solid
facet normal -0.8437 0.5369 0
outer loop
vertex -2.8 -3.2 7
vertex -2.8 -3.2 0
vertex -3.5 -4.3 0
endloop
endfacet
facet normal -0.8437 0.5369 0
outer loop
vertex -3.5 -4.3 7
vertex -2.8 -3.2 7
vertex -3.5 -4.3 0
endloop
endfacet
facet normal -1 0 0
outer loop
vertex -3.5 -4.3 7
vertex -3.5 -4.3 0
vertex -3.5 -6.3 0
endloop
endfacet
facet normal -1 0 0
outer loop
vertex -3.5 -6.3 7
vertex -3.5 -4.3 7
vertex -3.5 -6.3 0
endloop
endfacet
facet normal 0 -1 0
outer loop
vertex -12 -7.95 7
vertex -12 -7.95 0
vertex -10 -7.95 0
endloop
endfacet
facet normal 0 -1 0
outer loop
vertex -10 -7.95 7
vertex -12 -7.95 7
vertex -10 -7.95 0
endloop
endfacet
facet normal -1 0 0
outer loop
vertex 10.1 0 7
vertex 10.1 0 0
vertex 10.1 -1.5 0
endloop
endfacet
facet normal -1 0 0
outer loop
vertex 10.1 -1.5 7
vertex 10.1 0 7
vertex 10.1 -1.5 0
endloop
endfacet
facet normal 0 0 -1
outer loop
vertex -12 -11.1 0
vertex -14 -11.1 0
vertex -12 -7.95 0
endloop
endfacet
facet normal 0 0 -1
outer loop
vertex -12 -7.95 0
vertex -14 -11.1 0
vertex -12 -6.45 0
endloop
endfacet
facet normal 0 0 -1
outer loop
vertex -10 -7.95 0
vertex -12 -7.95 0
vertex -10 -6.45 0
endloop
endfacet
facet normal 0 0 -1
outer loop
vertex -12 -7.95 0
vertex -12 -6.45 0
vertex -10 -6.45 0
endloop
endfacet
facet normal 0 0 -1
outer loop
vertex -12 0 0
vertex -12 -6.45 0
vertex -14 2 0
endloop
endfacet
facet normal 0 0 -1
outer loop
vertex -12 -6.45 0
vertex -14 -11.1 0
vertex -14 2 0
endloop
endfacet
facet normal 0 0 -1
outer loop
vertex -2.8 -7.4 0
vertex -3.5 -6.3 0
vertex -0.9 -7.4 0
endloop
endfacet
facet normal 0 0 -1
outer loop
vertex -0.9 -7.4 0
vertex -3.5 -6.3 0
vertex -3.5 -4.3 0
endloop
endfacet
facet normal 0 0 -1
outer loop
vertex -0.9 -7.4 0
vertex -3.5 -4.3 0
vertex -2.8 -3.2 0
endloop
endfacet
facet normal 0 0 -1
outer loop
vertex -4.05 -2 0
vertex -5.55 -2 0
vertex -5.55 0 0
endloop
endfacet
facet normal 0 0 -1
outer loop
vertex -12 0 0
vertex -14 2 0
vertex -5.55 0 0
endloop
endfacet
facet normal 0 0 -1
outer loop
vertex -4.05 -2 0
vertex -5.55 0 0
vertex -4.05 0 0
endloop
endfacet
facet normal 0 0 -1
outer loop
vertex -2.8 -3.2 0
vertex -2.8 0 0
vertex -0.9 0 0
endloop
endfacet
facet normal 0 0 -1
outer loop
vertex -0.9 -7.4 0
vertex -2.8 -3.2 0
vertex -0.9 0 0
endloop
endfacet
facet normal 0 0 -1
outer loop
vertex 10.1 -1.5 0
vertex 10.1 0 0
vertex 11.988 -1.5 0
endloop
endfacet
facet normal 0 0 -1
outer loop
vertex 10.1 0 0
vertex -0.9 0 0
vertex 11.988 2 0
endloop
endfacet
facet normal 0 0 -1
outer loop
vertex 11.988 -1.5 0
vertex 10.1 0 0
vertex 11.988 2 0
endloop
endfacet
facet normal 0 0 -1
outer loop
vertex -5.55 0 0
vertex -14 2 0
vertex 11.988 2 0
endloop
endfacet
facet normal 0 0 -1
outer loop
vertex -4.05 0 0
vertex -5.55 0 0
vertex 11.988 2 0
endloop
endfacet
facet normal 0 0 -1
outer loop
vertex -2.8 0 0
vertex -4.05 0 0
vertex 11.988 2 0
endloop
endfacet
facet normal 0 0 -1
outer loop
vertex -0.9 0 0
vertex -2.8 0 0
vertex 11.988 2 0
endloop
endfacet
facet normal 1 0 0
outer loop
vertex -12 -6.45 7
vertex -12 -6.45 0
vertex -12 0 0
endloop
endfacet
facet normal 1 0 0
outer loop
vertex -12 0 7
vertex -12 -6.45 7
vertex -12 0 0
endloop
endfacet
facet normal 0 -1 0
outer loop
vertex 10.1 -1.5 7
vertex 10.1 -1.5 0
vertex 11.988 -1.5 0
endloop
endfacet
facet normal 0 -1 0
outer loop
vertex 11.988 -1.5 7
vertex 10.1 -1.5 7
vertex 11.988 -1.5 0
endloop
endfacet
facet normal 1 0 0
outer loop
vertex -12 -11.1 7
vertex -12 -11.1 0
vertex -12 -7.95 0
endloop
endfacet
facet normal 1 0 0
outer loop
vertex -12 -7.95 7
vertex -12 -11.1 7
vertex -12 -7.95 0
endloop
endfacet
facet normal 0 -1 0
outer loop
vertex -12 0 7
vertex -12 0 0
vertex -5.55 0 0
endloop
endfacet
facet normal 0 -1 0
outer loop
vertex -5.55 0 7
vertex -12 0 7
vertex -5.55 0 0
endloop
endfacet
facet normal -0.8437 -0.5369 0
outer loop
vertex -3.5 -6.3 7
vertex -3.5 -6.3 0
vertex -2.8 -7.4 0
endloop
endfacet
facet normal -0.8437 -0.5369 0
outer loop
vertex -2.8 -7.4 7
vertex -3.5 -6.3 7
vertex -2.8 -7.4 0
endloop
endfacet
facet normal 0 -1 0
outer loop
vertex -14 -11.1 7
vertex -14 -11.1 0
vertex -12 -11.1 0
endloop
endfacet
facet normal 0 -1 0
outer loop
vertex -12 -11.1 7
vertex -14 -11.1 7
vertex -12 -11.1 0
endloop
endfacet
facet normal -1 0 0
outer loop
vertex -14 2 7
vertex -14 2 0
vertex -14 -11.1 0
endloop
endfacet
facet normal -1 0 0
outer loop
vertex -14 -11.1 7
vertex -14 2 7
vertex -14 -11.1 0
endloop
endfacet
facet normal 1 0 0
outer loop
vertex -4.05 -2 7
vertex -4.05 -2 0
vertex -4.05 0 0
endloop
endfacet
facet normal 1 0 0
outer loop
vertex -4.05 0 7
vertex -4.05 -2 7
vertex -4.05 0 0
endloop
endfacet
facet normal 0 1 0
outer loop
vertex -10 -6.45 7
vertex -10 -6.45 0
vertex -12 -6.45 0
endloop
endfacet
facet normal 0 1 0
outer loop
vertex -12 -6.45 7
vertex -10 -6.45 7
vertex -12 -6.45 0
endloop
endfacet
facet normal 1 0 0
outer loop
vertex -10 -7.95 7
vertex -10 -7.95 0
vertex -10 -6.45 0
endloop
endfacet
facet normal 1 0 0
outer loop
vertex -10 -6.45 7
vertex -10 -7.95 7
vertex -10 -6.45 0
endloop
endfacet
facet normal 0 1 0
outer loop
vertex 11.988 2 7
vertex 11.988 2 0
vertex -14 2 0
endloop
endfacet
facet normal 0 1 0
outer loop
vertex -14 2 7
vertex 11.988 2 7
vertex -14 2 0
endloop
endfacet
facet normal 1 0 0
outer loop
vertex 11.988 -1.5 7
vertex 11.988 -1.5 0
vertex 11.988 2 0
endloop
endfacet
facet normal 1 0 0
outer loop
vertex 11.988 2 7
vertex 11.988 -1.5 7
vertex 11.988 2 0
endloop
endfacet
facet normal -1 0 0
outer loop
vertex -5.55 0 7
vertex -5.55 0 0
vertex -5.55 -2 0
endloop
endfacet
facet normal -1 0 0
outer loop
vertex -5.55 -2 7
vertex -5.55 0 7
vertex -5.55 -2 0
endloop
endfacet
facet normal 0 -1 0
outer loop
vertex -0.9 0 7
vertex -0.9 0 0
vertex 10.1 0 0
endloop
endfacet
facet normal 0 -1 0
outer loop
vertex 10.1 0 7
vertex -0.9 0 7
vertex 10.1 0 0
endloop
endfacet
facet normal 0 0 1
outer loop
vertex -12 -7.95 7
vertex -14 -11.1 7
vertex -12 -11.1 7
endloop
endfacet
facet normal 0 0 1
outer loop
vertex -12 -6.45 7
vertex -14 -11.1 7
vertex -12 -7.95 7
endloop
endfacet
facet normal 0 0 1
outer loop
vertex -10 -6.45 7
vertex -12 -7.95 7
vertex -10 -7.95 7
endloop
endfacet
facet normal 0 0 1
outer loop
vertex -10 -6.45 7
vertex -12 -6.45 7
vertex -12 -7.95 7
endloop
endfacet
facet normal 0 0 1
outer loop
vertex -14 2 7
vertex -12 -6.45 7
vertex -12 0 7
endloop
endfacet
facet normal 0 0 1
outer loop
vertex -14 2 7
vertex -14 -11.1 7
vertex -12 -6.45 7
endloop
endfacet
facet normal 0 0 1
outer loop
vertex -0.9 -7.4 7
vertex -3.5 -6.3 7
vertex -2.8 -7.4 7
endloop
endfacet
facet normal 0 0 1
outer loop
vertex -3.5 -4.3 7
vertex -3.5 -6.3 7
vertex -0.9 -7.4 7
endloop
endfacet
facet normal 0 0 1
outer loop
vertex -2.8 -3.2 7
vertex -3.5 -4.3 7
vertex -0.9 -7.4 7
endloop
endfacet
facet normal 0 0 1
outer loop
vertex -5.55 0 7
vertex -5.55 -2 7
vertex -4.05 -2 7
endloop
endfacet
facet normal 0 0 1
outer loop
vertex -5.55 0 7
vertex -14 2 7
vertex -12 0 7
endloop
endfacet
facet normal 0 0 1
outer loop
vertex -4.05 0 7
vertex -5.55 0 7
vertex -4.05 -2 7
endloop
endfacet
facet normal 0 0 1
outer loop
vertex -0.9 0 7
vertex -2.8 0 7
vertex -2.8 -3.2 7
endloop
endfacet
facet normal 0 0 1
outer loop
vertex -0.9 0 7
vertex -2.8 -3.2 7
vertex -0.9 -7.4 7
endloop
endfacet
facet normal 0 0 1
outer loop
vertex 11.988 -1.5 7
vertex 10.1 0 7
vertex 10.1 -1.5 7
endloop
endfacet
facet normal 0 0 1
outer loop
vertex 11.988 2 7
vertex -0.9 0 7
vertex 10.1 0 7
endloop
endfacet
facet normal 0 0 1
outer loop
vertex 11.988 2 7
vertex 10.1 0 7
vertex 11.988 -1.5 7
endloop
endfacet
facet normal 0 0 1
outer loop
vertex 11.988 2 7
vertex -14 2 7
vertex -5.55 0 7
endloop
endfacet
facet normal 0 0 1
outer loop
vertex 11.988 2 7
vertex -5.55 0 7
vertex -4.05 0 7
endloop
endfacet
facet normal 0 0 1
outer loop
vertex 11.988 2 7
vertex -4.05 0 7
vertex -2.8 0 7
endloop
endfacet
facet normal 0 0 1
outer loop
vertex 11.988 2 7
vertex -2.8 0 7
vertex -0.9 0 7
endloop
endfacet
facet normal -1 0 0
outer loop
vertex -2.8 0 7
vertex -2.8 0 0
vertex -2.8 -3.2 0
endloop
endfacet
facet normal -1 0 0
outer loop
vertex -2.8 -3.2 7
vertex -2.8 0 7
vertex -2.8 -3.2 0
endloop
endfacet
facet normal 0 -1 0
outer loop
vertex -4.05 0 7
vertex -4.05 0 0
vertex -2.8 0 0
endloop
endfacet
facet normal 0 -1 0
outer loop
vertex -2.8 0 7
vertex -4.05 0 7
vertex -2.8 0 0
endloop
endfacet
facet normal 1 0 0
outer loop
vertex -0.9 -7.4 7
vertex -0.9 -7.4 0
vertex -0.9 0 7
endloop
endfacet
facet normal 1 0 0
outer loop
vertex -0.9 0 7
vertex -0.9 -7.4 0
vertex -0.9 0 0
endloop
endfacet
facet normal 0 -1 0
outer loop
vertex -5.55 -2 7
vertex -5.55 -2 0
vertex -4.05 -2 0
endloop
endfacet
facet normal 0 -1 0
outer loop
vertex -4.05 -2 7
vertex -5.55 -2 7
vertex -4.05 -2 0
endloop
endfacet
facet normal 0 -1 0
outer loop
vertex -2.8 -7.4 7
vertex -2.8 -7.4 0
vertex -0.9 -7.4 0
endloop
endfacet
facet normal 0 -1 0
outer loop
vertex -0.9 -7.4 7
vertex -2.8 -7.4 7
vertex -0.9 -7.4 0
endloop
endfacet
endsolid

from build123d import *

# Parameters (mm, degrees)
F1_DEPTH = 7


with BuildPart() as f1:
    # F0 (on Top) → F1 (new body)
    with BuildSketch(Plane.XY):
        Polygon((-0.9, -7.4), (-0.9, 0), (-2.8, 0), (-2.8, -3.200004), (-2.8, -7.4), align=None)
        Polygon((-2.8, 0), (-0.9, 0), (10.1, 0), (10.1, -1.5), (11.988339, -1.5), (11.988339, 2), (0, 2), (-5.55, 2), (-5.55, 0), (-5.55, -2), (-4.05, -2), (-4.05, 0), align=None)
        Polygon((-2.8, -7.4), (-2.8, -3.200004), (-3.5, -4.300002), (-3.5, -6.300002), align=None)
        Polygon((-12, 0), (-5.55, 0), (-5.55, 2), (-14, 2), (-14, -6.45), (-12, -6.45), align=None)
        Polygon((-10, -6.45), (-12, -6.45), (-14, -6.45), (-14, -11.1), (-12, -11.1), (-12, -9.2), (-12, -7.95), (-10, -7.95), align=None)
    extrude(amount=F1_DEPTH)


solid = f1.part
